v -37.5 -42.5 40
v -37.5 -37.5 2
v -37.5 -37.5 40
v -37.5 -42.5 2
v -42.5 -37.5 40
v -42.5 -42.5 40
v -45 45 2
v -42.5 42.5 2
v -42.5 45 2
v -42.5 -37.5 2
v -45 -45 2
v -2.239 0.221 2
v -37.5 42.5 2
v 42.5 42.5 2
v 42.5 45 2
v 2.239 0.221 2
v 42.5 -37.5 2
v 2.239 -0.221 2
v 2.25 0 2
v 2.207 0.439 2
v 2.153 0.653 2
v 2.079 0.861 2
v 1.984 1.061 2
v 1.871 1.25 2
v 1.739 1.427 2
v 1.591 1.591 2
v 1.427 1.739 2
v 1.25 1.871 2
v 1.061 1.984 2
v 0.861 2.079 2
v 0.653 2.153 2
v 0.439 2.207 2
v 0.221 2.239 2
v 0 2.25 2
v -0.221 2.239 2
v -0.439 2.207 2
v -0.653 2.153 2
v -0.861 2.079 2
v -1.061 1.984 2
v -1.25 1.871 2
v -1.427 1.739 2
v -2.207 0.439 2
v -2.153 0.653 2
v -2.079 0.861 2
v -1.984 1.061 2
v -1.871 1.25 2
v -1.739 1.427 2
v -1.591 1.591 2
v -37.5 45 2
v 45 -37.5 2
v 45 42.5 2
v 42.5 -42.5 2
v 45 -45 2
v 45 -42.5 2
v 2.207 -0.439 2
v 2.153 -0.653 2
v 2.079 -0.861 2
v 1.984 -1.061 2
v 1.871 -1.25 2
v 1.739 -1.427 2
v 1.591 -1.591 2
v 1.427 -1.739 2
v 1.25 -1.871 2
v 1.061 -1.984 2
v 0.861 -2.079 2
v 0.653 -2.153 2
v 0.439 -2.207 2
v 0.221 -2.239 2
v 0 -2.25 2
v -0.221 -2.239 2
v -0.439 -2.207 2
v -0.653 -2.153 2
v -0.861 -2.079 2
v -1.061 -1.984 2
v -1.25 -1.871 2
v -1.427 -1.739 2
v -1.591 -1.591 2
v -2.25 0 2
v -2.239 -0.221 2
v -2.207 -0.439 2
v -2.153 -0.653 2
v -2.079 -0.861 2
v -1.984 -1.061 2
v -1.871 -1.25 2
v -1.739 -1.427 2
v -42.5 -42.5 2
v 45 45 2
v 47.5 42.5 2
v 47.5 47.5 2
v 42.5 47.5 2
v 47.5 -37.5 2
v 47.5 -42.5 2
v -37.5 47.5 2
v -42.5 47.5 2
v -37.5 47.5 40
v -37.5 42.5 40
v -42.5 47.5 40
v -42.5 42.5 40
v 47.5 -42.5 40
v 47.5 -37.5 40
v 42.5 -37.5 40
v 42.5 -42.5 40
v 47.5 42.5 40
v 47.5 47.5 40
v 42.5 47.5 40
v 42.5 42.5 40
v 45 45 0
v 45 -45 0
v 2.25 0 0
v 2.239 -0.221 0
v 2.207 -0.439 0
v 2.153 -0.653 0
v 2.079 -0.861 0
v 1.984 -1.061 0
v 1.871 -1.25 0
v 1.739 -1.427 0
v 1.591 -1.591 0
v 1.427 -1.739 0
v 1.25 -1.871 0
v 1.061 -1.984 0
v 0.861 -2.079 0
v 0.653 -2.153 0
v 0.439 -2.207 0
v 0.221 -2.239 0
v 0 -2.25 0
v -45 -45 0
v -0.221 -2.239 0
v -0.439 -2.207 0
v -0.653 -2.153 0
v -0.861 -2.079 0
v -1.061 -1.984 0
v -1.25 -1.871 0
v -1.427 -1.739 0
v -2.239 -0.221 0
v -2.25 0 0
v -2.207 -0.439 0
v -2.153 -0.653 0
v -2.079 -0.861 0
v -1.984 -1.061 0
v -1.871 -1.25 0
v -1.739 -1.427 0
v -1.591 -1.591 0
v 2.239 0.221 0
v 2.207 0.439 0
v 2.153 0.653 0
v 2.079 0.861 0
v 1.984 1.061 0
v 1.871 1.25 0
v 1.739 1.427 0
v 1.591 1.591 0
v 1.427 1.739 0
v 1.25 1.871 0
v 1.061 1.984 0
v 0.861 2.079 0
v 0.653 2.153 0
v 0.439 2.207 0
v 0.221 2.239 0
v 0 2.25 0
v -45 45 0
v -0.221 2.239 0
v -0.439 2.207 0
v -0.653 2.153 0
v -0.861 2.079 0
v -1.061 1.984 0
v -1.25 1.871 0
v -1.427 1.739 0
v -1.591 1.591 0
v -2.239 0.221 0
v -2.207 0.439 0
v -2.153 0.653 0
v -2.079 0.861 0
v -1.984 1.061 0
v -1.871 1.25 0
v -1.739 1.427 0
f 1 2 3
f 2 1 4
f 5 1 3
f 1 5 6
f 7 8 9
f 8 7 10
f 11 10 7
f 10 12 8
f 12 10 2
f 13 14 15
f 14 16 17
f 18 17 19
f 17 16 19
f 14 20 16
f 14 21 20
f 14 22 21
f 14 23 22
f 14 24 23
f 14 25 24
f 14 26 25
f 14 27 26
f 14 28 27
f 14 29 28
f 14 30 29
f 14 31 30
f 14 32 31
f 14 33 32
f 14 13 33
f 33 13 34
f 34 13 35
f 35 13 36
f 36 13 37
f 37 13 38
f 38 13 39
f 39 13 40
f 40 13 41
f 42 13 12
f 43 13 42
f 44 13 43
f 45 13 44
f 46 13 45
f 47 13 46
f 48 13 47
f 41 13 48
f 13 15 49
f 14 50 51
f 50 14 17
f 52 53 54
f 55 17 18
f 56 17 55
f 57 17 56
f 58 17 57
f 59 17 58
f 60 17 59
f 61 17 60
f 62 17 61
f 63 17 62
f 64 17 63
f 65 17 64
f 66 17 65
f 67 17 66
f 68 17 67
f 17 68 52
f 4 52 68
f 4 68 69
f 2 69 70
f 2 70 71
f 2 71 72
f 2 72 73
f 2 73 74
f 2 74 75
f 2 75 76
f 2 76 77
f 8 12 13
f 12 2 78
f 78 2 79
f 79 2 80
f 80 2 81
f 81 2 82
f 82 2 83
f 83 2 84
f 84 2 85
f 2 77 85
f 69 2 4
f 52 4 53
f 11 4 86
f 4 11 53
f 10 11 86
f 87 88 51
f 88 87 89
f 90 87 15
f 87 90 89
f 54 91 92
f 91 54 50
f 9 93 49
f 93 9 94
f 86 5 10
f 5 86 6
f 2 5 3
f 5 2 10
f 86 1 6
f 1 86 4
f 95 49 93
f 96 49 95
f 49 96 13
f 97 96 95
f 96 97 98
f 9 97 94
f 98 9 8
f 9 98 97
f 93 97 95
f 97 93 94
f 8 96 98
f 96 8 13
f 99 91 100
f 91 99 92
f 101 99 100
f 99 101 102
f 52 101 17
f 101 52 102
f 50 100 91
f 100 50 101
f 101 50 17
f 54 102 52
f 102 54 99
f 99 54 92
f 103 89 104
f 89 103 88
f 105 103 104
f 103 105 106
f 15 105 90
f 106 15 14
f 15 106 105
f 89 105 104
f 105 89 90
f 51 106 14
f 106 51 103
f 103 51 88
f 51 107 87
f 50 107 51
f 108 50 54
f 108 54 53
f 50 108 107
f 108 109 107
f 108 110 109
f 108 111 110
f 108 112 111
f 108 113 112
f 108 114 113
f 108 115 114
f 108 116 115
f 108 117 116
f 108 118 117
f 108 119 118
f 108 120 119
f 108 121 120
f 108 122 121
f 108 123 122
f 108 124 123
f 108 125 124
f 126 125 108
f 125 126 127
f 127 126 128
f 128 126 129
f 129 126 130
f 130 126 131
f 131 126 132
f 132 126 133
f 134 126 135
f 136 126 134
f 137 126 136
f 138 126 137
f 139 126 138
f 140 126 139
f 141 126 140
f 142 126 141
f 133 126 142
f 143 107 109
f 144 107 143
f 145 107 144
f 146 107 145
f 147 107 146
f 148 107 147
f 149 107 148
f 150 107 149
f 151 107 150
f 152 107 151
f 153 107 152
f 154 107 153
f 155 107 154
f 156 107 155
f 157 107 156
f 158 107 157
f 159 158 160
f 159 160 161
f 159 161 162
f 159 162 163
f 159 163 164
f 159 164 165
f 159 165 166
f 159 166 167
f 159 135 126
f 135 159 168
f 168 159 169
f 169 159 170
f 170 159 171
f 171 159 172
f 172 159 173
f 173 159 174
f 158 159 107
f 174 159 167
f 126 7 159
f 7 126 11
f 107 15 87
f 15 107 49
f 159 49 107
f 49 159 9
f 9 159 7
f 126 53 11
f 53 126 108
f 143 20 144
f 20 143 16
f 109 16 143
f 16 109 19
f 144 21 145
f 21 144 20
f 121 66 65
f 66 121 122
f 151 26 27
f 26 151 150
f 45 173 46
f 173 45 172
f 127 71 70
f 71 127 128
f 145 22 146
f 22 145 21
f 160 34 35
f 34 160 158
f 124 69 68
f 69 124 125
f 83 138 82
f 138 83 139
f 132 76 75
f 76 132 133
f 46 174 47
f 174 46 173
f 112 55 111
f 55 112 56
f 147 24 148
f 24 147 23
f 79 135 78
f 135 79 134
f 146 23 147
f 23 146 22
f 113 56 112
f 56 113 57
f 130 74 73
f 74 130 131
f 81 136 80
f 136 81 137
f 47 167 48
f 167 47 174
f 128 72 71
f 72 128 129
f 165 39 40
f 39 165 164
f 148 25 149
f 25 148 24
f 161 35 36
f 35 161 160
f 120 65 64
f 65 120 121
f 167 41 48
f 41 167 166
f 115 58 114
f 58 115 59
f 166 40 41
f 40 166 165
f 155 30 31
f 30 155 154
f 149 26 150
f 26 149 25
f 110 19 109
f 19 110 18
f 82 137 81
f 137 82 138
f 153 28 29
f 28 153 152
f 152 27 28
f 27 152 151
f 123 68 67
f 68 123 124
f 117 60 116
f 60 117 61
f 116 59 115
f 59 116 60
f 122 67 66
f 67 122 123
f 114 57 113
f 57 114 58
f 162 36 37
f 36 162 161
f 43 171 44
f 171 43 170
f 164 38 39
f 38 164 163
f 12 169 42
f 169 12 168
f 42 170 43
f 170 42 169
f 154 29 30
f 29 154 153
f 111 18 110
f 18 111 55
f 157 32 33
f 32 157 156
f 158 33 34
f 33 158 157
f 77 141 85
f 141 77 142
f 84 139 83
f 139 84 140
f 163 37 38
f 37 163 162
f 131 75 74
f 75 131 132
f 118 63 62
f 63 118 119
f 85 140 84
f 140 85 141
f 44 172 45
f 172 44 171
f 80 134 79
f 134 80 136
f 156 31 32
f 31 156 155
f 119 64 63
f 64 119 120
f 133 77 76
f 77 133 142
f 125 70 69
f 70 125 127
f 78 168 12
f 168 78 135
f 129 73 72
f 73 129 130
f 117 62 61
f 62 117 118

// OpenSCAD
// DIY magnetic stirrer housing for 80 mm PC case fan
// Print orientation: top plate down on bed (z = 0), walls build upward (+Z)

$fn = 64;

// ---- Dimensions (mm) ----
plate_t      = 2;     // top plate thickness
wall_t       = 2.5;   // wall thickness
box_h        = 40;    // total height of box (top of walls)
outer_x      = 90;    // outer size in X
outer_y      = 90;    // outer size in Y
hole_d       = 4.5;   // screw hole diameter (M4)
hole_pitch   = 71.5;  // square pattern pitch for screw holes
notch_w      = 12;    // cable notch width
notch_depth  = 8;     // cable notch depth from open edge (z = 32 to 40)
eps          = 0.5;   // cutter overshoot past faces

// ---- Model ----
difference() {
    union() {
        // Top plate (lies on z = 0)
        translate([-outer_x / 2, -outer_y / 2, 0])
            cube([outer_x, outer_y, plate_t]);

        // Four walls rising from plate to z = box_h
        for (sx = [-1, 1], sy = [-1, 1])
            translate([sx * (outer_x / 2 - wall_t), sy * (outer_y / 2 - wall_t), plate_t])
                cube([2 * wall_t, 2 * wall_t, box_h - plate_t]);
    }

    // Screw holes through top plate on centred square pattern
    for (i = [0 : 3]) {
        x = -hole_pitch / 2 + (i - 1.5) * hole_pitch;
        y = -hole_pitch / 2 + (i - 1.5) * hole_pitch;
        translate([x, y, -eps])
            cylinder(d = hole_d, h = plate_t + 2 * eps);
    }

    // Cable notch in one wall, centred along the wall
    translate([-outer_x / 2 + wall_t, -notch_w / 2, box_h - notch_depth])
        cube([notch_w, notch_w, notch_depth + eps]);
}
